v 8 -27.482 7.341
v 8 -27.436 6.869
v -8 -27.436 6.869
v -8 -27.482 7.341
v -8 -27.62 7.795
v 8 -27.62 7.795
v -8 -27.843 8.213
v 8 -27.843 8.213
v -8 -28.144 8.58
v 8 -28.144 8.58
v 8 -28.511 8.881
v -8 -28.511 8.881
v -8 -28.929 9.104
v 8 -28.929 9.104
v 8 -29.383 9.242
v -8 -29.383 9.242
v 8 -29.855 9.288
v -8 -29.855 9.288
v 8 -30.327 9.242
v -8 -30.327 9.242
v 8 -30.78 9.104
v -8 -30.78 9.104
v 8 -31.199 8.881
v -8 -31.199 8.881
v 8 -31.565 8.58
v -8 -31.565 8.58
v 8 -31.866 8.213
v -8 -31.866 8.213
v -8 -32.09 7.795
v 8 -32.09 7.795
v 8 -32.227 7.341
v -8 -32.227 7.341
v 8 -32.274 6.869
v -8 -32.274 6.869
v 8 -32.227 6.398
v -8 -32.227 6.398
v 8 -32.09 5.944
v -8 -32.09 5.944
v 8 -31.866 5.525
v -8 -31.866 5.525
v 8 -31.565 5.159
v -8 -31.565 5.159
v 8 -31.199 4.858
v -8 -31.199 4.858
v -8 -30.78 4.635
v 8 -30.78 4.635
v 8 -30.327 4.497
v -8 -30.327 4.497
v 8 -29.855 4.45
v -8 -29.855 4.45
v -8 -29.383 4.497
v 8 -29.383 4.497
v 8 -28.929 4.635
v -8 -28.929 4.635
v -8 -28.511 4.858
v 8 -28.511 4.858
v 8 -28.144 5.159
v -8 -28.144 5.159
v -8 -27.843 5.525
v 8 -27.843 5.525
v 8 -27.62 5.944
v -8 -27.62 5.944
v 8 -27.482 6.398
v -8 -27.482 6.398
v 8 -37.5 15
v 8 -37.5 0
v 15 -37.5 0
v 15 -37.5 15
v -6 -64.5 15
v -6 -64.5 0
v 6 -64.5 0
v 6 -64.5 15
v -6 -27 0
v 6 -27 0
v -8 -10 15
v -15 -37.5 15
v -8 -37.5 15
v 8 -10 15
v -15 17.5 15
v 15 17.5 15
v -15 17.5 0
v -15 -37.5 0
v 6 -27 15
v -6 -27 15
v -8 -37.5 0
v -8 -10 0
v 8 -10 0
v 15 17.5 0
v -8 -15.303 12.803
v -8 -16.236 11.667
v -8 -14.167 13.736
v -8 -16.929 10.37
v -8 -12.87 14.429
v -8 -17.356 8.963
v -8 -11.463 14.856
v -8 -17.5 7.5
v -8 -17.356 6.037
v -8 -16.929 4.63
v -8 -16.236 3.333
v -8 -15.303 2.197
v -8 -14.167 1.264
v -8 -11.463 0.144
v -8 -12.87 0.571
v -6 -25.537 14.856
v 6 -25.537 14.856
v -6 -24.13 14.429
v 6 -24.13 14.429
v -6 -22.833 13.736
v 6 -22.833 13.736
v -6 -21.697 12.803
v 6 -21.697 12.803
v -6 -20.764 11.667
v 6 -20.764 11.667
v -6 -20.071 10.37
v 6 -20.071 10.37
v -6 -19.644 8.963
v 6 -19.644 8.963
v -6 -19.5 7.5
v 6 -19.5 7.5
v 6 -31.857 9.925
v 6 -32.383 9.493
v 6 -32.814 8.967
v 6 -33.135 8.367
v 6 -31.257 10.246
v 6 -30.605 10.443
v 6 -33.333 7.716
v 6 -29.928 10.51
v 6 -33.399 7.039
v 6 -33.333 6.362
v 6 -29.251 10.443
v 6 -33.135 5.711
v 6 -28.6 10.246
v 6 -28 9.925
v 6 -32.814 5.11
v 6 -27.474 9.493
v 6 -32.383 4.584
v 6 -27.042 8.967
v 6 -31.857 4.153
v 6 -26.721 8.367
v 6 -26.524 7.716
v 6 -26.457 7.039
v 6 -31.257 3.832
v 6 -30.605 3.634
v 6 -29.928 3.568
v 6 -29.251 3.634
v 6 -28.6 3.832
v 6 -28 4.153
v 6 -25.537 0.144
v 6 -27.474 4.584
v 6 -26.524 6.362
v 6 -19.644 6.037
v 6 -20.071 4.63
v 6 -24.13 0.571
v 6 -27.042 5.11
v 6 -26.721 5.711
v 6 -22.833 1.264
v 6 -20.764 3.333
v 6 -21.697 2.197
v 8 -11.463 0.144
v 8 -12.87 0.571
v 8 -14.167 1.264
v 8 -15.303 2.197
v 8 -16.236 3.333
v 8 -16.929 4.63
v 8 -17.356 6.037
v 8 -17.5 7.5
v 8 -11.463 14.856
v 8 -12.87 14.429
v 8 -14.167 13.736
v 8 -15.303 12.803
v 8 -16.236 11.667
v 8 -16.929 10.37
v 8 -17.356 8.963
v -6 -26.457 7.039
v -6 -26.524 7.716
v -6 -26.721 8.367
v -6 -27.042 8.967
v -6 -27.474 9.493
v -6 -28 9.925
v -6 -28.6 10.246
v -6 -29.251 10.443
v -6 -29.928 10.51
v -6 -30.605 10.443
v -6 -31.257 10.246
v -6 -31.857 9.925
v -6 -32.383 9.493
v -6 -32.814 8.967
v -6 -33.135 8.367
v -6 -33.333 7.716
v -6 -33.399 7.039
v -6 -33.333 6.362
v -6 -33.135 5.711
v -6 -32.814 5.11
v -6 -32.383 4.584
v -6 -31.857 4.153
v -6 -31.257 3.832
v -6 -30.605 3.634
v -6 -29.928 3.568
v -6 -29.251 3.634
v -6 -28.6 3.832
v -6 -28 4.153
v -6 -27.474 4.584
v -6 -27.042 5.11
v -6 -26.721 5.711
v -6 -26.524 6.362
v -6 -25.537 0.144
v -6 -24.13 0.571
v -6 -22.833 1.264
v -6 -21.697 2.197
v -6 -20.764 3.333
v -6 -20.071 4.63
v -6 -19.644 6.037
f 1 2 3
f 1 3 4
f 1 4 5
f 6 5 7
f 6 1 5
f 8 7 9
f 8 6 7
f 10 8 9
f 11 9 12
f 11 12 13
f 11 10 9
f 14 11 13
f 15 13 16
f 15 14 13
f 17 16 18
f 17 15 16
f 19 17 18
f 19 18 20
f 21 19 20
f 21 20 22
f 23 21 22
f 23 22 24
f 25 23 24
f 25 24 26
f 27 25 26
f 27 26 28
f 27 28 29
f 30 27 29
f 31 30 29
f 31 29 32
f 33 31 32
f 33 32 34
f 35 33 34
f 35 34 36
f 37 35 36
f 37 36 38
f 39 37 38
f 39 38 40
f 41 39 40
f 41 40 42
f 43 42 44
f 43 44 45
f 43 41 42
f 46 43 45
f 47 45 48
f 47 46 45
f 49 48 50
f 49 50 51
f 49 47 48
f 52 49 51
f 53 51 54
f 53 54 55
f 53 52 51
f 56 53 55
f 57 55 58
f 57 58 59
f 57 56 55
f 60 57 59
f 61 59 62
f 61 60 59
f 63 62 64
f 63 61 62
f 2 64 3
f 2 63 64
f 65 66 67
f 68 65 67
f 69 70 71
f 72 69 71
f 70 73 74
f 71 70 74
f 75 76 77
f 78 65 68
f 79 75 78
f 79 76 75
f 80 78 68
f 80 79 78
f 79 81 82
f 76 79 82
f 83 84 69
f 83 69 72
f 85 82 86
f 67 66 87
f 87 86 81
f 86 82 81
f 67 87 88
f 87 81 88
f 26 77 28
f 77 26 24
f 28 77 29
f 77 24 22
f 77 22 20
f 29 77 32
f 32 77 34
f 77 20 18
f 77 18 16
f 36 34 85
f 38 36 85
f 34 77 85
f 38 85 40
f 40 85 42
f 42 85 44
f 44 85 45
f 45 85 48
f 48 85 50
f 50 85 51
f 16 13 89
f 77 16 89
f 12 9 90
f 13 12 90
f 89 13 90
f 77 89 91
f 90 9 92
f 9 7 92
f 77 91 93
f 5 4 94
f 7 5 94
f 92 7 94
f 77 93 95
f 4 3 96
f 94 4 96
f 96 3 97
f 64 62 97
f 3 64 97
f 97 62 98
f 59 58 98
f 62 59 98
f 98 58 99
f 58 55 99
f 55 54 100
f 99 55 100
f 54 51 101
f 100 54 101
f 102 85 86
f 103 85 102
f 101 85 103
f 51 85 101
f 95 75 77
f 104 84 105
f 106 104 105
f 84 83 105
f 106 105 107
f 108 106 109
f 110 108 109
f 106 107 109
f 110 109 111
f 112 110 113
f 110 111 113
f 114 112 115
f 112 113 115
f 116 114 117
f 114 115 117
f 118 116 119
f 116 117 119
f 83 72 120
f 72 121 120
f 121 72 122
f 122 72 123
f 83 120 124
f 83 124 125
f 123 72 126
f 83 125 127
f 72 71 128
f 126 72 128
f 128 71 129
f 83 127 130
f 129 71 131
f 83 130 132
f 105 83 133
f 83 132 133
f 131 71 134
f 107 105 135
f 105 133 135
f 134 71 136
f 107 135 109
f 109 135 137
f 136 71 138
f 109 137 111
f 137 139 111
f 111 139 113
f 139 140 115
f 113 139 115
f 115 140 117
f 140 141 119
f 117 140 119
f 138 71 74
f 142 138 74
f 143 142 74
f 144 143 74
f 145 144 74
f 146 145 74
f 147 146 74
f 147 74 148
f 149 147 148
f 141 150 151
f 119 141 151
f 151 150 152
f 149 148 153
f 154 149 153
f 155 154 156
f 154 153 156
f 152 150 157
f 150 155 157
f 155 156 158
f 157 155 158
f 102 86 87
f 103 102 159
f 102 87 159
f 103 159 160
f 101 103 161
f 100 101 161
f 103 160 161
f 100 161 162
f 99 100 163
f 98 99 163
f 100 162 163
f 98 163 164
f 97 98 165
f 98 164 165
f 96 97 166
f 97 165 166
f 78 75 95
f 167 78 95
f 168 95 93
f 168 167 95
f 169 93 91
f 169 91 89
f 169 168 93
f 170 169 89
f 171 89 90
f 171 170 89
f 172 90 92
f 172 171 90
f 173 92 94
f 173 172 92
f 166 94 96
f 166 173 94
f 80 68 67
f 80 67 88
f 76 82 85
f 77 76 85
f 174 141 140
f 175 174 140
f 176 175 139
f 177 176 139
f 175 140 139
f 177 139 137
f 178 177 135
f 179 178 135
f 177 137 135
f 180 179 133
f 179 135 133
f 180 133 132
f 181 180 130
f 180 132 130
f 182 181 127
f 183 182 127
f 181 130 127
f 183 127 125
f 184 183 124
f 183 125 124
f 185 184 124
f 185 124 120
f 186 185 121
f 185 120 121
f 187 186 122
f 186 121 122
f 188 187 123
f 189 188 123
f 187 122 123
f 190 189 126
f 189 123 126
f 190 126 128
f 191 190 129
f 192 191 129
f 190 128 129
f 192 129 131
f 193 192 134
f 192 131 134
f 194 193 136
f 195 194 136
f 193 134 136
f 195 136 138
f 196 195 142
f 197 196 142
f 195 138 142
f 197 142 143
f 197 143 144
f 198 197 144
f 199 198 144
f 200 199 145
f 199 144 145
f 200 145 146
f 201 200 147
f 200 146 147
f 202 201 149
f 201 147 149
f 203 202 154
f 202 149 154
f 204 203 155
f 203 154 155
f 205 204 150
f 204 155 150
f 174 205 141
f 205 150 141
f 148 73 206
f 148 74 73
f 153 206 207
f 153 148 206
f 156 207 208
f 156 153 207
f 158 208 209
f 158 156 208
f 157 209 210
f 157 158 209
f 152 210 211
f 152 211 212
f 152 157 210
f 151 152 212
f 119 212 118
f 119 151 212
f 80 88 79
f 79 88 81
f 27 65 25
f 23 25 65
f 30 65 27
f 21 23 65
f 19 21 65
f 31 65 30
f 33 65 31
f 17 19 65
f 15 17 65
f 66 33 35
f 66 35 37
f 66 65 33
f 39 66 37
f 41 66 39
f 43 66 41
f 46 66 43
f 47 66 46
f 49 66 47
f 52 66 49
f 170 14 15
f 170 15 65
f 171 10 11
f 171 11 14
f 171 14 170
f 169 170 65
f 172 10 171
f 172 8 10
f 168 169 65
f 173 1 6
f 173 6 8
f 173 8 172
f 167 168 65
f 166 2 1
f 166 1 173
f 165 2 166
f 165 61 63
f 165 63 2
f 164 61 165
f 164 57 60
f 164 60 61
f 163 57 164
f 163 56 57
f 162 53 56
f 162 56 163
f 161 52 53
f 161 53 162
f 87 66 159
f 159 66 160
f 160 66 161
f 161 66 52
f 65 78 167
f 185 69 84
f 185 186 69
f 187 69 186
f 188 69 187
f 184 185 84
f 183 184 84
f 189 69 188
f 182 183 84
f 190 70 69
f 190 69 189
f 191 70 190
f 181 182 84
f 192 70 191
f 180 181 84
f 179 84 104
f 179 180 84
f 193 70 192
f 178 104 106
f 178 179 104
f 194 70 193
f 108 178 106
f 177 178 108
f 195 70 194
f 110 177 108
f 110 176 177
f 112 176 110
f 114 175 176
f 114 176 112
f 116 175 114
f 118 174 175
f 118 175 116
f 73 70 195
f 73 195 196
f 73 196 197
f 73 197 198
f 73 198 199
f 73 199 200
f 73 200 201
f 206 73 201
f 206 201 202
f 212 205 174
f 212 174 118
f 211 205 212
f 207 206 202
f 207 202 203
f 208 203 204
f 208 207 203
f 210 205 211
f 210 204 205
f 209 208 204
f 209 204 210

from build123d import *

# Parameters (mm, degrees)
F0_W     = 7
F0_H     = 20
F1_DEPTH = 15
F2_W     = 12
F2_H     = 45
F3_DEPTH = 15
F4_R     = 3.4711759081
F5_DEPTH = 12
F6_R     = 2.4190256098
F7_DEPTH = 30
F8_R     = 7.49999
F8_2_R   = 7.49999


# Not quite as in the source:
# - a fillet or chamfer is up to 0.001 mm smaller than in the source, because OpenCascade refuses the exact size


with BuildPart() as f1:
    # F0 (on Top) → F1 (new body)
    with BuildSketch(Plane.XY):
        Polygon((15, 17.5), (-15, 17.5), (-15, -17.5), (-8, -17.5), (8, -17.5), (15, -17.5), align=None)
        with Locations((-11.5, -27.5)):
            Rectangle(F0_W, F0_H)
        with Locations((11.5, -27.5)):
            Rectangle(F0_W, F0_H)
    extrude(amount=F1_DEPTH)

    # F6 (on face) → F7 (join, through all)
    with BuildSketch(Plane.YZ.offset(15)):
        with Locations((-29.854727909, 6.86943857)):
            Circle(F6_R)
    extrude(amount=-F7_DEPTH)

    # F8 (radius 7.5 in the source; OpenCascade refuses exactly that, so slightly less here)
    f8_edges = [f1.edges().sort_by_distance(p)[0] for p in [
        (0, -17.5, 0),
        (0, -17.5, 15),
    ]]
    fillet(f8_edges, radius=F8_R)


with BuildPart() as f3:
    # F2 (on Top) → F3 (new body)
    with BuildSketch(Plane.XY):
        with Locations((0, -42)):
            Rectangle(F2_W, F2_H)
    extrude(amount=F3_DEPTH)

    # F4 (on face) → F5 (cut, through all)
    with BuildSketch(Plane.YZ.offset(6)):
        with Locations((-29.9282446504, 7.0389099419)):
            Circle(F4_R)
    extrude(amount=-F5_DEPTH, mode=Mode.SUBTRACT)

    # F8#2 (radius 7.5 in the source; OpenCascade refuses exactly that, so slightly less here)
    f8_2_edges = [f3.edges().sort_by_distance(p)[0] for p in [
        (0, -19.5, 0),
        (0, -19.5, 15),
    ]]
    fillet(f8_2_edges, radius=F8_2_R)


solid = Compound([f1.part, f3.part])
